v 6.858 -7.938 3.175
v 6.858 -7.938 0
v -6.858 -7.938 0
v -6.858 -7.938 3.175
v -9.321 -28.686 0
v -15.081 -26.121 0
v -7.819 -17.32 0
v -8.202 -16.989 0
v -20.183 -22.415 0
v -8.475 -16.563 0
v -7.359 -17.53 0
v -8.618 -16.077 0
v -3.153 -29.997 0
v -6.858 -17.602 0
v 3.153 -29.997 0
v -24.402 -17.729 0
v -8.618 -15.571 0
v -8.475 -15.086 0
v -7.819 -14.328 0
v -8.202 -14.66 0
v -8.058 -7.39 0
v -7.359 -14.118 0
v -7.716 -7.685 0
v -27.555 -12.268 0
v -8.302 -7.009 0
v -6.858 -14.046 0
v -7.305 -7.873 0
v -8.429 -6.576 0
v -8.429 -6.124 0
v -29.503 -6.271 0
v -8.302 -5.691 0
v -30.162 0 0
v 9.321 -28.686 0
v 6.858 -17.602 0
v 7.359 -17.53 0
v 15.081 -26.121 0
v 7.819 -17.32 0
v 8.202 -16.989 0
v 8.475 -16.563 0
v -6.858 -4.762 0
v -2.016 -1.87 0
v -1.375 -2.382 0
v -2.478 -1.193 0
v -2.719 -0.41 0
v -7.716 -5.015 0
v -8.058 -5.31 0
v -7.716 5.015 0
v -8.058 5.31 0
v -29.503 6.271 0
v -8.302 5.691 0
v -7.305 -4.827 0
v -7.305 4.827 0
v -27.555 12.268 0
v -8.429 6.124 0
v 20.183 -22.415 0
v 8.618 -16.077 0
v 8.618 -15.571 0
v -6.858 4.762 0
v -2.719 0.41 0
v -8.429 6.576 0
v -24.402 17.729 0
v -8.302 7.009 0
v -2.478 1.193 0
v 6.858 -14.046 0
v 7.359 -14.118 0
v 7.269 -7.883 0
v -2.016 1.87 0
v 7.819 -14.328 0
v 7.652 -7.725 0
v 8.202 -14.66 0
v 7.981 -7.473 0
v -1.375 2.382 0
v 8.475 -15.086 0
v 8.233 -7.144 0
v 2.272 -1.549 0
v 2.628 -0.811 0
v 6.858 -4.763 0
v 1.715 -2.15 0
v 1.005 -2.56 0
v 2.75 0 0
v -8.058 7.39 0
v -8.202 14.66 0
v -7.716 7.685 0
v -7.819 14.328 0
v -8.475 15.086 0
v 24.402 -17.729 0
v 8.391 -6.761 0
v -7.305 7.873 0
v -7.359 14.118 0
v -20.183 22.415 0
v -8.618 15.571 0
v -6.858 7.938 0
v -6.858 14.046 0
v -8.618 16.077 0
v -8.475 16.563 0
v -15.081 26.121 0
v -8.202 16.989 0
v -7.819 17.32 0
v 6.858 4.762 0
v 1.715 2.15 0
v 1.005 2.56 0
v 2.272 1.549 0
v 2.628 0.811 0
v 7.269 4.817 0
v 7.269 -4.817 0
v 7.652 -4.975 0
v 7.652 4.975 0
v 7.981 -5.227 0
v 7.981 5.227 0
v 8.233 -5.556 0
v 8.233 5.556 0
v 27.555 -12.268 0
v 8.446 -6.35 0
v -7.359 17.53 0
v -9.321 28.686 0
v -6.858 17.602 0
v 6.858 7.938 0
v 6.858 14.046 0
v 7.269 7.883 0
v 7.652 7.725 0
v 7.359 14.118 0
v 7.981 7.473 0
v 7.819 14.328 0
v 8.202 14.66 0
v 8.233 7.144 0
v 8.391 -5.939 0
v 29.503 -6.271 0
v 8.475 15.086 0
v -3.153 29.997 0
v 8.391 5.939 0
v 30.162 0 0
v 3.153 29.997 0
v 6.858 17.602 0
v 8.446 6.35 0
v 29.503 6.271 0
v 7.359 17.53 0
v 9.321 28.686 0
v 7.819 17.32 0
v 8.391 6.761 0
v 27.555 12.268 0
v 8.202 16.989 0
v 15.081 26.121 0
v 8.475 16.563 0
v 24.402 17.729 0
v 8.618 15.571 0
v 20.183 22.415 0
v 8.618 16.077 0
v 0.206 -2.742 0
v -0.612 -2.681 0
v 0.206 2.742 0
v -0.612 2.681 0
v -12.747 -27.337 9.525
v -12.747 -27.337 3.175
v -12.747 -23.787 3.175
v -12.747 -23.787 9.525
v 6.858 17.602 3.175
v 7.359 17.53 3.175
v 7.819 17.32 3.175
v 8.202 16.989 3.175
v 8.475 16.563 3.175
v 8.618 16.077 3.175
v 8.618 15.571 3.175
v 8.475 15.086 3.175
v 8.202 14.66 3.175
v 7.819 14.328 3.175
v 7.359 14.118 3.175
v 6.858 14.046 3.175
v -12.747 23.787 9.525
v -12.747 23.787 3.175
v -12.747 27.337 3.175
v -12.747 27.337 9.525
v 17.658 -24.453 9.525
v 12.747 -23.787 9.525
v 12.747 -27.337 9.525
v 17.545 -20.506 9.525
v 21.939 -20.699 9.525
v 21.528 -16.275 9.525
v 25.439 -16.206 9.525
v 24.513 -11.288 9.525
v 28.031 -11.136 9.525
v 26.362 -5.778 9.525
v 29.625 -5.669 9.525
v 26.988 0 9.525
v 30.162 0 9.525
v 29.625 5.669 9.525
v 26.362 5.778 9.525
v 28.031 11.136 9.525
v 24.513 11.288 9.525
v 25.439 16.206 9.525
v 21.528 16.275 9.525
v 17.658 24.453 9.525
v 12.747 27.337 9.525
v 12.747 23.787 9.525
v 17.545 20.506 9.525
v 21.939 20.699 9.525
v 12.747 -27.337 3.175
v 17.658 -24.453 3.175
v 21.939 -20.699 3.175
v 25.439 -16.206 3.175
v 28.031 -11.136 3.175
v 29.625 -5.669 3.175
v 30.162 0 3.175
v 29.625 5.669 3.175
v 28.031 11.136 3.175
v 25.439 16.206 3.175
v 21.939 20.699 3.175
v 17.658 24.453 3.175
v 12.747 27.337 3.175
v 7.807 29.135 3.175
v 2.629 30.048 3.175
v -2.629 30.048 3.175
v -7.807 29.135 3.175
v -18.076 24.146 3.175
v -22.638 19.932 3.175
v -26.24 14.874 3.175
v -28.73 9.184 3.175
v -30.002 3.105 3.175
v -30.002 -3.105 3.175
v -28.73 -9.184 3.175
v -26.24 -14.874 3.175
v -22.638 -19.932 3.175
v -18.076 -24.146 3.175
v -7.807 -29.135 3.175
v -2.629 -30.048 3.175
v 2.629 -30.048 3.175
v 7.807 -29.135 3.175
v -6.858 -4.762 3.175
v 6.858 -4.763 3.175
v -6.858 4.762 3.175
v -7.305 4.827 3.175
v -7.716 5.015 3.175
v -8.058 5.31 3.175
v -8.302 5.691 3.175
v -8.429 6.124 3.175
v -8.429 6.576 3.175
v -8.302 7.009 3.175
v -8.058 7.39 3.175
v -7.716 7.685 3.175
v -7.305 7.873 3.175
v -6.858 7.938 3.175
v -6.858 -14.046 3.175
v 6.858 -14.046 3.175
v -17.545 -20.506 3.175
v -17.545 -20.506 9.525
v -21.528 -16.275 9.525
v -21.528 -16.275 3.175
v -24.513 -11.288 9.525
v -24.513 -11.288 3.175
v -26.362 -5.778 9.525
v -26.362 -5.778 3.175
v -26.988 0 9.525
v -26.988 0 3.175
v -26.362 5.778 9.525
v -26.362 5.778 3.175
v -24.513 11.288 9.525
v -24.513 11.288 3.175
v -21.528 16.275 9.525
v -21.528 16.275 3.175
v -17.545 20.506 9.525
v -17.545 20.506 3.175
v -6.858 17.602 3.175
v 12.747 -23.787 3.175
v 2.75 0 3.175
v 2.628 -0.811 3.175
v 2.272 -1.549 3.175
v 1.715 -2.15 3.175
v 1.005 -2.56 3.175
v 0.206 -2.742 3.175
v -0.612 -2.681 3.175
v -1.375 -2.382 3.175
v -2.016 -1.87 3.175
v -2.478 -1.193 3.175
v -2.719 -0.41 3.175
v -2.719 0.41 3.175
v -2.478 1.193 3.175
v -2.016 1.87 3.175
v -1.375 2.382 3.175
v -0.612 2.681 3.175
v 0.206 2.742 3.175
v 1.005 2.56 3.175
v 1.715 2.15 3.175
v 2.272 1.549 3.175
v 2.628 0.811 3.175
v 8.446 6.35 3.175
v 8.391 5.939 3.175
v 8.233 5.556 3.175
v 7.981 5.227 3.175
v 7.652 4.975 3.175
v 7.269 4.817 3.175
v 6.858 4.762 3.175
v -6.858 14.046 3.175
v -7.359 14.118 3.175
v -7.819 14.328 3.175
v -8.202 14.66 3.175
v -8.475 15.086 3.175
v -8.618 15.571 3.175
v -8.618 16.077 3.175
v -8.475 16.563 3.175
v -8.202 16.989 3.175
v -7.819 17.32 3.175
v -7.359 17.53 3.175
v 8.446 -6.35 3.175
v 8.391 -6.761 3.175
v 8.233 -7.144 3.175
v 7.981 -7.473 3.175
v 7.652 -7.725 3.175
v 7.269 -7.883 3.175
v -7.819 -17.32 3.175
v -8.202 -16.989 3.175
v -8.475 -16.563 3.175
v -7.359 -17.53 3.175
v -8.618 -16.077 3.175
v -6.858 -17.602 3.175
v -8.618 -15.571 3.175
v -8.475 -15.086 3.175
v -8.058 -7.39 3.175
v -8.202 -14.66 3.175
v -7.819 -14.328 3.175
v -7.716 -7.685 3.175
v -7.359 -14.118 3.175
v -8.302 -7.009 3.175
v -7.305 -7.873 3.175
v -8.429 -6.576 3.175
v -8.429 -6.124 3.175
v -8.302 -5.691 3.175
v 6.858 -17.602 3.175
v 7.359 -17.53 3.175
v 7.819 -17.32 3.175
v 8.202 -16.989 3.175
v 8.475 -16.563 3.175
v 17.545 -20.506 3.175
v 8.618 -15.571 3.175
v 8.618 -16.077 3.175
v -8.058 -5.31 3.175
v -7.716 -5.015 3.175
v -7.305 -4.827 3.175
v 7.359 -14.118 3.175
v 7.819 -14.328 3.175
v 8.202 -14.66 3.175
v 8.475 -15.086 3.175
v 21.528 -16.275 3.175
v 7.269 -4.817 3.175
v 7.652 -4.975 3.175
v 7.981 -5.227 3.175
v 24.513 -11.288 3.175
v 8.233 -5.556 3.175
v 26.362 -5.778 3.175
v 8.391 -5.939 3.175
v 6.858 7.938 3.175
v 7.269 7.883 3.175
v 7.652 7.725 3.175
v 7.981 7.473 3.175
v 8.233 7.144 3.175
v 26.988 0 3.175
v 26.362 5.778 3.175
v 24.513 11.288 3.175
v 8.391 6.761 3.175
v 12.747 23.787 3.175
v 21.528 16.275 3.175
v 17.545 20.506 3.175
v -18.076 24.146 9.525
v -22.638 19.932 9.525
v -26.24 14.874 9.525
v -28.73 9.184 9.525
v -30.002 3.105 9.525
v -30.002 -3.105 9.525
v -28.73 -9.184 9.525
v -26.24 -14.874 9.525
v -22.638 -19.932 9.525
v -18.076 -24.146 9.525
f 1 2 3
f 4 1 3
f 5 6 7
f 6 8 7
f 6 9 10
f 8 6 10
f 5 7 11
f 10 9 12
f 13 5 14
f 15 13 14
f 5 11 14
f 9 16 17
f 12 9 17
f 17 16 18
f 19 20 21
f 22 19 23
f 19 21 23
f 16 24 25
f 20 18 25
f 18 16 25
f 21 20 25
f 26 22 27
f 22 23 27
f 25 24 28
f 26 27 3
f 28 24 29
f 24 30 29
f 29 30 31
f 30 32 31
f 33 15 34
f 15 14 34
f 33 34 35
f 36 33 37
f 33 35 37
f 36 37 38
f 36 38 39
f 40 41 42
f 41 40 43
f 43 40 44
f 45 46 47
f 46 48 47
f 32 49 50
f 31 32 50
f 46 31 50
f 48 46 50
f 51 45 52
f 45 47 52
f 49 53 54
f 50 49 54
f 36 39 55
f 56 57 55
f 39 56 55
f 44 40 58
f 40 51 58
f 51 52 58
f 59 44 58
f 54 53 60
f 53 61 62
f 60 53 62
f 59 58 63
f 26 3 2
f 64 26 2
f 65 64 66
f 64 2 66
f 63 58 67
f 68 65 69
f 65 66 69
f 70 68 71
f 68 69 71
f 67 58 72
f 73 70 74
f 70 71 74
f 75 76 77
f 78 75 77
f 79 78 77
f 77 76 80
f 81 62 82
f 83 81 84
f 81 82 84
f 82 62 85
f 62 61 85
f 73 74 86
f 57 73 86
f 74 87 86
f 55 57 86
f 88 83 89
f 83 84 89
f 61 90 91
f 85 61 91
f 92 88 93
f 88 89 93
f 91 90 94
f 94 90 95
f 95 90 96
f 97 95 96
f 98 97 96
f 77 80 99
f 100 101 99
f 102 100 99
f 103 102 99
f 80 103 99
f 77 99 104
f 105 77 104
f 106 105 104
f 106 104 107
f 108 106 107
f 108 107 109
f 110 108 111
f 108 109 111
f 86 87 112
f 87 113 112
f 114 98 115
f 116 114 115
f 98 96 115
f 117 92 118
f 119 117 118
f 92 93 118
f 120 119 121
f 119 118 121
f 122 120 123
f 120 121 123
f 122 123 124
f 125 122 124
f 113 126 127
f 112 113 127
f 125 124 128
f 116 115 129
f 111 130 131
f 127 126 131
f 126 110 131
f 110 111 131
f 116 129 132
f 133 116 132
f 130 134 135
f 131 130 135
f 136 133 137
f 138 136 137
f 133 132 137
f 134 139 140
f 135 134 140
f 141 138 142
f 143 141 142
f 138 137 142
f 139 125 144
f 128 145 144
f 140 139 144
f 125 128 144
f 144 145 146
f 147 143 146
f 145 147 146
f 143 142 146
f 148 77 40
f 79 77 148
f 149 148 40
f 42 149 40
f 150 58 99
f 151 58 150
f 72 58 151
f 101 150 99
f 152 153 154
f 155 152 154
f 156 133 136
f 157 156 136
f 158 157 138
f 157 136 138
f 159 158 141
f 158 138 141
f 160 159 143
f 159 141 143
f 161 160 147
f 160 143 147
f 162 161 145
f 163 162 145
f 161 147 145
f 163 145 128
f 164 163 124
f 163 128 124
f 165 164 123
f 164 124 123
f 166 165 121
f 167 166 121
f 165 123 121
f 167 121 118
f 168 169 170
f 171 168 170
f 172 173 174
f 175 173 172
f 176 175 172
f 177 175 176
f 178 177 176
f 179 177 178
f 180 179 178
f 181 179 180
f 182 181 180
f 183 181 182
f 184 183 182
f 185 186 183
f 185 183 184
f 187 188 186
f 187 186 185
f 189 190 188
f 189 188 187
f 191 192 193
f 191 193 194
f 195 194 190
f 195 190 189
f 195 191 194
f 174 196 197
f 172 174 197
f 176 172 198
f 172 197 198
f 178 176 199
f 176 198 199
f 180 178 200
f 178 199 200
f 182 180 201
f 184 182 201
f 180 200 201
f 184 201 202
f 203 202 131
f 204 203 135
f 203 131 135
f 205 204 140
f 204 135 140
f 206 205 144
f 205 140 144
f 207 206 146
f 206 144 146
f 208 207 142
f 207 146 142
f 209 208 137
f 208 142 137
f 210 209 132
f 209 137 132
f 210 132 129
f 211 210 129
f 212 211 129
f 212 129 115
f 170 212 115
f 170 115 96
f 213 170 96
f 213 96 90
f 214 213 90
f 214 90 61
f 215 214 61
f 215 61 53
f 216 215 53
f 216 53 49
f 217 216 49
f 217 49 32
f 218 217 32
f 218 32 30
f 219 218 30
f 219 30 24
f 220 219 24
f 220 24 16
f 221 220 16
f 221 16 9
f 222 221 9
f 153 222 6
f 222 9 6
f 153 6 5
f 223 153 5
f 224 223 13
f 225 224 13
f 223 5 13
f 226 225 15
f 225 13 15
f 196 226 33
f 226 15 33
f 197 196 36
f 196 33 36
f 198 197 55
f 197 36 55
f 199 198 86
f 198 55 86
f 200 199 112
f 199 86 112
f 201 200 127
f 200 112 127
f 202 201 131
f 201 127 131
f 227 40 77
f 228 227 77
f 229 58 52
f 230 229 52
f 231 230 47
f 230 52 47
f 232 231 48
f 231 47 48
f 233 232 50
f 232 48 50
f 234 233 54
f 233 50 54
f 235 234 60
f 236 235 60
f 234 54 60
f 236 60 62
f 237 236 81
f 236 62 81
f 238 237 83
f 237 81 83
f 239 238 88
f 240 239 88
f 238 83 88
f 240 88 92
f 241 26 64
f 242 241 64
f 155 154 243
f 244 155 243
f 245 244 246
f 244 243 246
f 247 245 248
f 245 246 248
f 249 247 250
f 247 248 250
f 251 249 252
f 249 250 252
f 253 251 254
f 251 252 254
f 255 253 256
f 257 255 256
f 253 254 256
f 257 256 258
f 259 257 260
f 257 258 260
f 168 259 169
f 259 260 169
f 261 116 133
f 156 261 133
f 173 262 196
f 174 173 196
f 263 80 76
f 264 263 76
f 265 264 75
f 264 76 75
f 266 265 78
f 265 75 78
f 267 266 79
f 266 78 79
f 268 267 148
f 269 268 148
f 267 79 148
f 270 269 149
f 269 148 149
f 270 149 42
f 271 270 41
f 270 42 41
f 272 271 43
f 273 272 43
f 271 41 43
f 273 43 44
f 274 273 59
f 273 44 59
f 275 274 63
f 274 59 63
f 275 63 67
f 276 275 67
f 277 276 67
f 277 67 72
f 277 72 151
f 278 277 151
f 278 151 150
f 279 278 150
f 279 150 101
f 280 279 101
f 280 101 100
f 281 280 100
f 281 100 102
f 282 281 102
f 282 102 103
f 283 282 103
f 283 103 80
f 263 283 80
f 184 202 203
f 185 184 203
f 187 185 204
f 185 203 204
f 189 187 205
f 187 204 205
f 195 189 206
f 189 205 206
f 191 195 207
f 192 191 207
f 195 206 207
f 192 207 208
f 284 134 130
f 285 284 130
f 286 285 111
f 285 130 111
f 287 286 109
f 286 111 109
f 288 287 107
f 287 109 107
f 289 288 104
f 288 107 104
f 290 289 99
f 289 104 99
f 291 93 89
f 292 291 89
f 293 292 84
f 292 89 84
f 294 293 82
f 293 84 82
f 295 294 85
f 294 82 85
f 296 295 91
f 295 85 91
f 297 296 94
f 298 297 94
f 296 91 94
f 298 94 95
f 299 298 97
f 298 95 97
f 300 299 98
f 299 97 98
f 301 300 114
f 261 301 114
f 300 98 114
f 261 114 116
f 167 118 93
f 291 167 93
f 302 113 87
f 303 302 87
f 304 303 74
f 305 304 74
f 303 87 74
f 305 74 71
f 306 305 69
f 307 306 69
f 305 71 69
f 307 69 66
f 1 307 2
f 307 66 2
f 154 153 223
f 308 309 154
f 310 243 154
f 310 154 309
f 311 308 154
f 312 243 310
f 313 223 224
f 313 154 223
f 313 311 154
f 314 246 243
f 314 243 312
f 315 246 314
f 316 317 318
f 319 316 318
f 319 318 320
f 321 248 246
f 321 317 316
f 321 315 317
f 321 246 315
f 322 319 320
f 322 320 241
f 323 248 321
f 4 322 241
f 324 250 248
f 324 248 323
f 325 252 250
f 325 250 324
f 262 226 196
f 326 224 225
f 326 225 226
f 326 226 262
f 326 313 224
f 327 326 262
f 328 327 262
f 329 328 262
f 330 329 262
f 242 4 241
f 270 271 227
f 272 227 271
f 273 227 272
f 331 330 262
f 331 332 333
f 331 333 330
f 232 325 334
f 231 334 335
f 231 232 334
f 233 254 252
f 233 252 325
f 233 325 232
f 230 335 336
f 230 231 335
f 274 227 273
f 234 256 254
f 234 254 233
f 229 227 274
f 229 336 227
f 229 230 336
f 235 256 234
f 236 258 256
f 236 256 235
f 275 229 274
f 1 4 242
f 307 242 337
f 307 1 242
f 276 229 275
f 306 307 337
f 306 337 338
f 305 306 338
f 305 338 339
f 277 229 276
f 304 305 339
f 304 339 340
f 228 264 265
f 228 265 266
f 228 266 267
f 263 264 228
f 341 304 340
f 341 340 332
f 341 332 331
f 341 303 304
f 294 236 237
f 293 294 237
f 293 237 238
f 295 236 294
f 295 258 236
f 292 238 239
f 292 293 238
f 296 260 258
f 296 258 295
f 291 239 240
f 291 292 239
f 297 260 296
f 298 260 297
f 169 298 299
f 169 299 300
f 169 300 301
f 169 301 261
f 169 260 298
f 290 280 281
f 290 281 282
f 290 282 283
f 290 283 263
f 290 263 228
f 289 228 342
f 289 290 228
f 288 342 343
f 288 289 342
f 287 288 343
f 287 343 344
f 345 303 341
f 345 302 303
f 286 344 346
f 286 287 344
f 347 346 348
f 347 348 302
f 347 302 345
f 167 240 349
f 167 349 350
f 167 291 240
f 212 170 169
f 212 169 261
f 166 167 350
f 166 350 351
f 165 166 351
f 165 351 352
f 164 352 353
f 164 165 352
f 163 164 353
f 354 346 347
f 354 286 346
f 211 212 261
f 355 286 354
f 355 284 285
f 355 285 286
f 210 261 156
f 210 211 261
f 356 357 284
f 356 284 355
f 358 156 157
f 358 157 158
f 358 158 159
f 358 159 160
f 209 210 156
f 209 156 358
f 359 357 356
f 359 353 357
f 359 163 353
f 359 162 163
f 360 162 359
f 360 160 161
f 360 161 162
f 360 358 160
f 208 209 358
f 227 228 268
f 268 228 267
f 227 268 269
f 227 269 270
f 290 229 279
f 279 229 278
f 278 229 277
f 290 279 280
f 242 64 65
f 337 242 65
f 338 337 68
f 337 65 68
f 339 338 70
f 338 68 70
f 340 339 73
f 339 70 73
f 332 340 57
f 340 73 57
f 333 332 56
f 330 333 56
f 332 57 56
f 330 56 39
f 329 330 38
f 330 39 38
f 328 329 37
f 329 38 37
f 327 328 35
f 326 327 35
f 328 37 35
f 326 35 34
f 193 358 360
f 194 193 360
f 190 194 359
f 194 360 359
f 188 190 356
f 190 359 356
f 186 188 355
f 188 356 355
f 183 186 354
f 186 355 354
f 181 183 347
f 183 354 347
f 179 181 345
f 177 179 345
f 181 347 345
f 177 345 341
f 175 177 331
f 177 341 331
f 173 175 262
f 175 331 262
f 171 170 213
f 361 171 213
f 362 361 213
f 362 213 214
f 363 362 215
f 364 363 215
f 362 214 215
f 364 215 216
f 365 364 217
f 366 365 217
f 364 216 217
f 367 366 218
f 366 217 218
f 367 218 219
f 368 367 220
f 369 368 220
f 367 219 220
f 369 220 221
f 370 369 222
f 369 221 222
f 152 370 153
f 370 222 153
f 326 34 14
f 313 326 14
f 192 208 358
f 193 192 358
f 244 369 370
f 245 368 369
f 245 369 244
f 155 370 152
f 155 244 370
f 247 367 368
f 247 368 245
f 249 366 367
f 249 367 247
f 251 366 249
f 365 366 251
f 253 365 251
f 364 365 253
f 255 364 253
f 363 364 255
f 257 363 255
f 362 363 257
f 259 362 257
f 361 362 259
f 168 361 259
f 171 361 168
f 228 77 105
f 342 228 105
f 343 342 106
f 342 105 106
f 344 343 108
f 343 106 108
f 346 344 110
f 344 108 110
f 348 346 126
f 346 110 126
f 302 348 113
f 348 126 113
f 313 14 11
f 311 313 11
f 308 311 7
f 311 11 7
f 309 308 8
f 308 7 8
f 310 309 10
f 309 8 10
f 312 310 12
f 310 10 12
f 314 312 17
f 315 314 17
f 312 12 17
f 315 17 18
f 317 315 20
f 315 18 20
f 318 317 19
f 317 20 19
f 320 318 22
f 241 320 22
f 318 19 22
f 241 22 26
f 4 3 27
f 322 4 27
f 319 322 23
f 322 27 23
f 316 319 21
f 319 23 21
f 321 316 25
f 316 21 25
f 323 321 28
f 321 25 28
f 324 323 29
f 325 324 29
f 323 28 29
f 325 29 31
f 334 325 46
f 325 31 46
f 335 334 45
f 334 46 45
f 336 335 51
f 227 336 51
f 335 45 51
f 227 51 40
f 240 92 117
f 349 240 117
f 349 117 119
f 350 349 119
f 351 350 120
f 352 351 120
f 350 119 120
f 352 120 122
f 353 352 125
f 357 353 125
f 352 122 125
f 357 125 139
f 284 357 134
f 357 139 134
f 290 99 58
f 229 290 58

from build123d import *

# Parameters (mm, degrees)
F0_R     = 30.1625
F1_DEPTH = 3.175
F3_DEPTH = 6.35
F4_R     = 2.75
F5_DEPTH = 25.4


with BuildPart() as f1:
    # F0 (on Top) → F1 (new body)
    with BuildSketch(Plane.XY):
        Circle(F0_R)
    extrude(amount=F1_DEPTH)

    # F2 (on face) → F3 (join)
    with BuildSketch(Plane.XY.offset(3.175)):
        with BuildLine():
            ThreePointArc((-12.747223, -23.787254), (-26.9875, 0), (-12.747223, 23.787254))
            Line((-12.747223, 23.787254), (-12.747223, 27.336509))
            ThreePointArc((-12.747223, 27.336509), (-30.1625, 0), (-12.747223, -27.336509))
            Line((-12.747223, -27.336509), (-12.747223, -23.787254))
        make_face()
        with BuildLine():
            ThreePointArc((30.1625, 0), (25.438794, 16.206299), (12.747223, 27.336509))
            Line((12.747223, 27.336509), (12.747223, 23.787254))
            ThreePointArc((12.747223, 23.787254), (26.9875, 0), (12.747223, -23.787254))
            Line((12.747223, -23.787254), (12.747223, -27.336509))
            ThreePointArc((12.747223, -27.336509), (25.438794, -16.206299), (30.1625, 0))
        make_face()
    extrude(amount=F3_DEPTH)

    # F4 (on face) → F5 (cut)
    with BuildSketch(Plane(origin=(0, 0, 0), x_dir=(1, 0, 0), z_dir=(0, 0, -1))):
        with BuildLine():
            Line((6.858, 17.6022), (-6.858, 17.6022))
            ThreePointArc((-6.858, 17.6022), (-8.636, 15.8242), (-6.858, 14.0462))
            Line((-6.858, 14.0462), (6.858, 14.0462))
            ThreePointArc((6.858, 14.0462), (8.636, 15.8242), (6.858, 17.6022))
        make_face()
        with BuildLine():
            ThreePointArc((6.858, -17.6022), (8.636, -15.8242), (6.858, -14.0462))
            Line((6.858, -14.0462), (-6.858, -14.0462))
            ThreePointArc((-6.858, -14.0462), (-8.636, -15.8242), (-6.858, -17.6022))
            Line((-6.858, -17.6022), (6.858, -17.6022))
        make_face()
        Circle(F4_R)
        with BuildLine():
            ThreePointArc((-6.858, 4.7625), (-5.735468, 5.227468), (-5.2705, 6.35))
            ThreePointArc((-5.2705, 6.35), (-5.735468, 7.472532), (-6.858, 7.9375))
            ThreePointArc((-6.858, 7.9375), (-8.4455, 6.35), (-6.858, 4.7625))
        make_face()
        with BuildLine():
            ThreePointArc((-6.858, 7.9375), (-5.735468, 7.472532), (-5.2705, 6.35))
            ThreePointArc((-5.2705, 6.35), (-5.735468, 5.227468), (-6.858, 4.7625))
            Line((-6.858, 4.7625), (6.858, 4.7625))
            ThreePointArc((6.858, 4.7625), (5.2705, 6.35), (6.858, 7.9375))
            Line((6.858, 7.9375), (-6.858, 7.9375))
        make_face()
        with BuildLine():
            ThreePointArc((8.4455, 6.35), (7.980532, 7.472532), (6.858, 7.9375))
            ThreePointArc((6.858, 7.9375), (5.2705, 6.35), (6.858, 4.7625))
            ThreePointArc((6.858, 4.7625), (7.980532, 5.227468), (8.4455, 6.35))
        make_face()
        with BuildLine():
            Line((6.858, -4.7625), (-6.858, -4.7625))
            ThreePointArc((-6.858, -4.7625), (-5.735468, -5.227468), (-5.2705, -6.35))
            ThreePointArc((-5.2705, -6.35), (-5.735468, -7.472532), (-6.858, -7.9375))
            Line((-6.858, -7.9375), (6.858, -7.9375))
            ThreePointArc((6.858, -7.9375), (5.2705, -6.35), (6.858, -4.7625))
        make_face()
        with BuildLine():
            ThreePointArc((-5.2705, -6.35), (-5.735468, -5.227468), (-6.858, -4.7625))
            ThreePointArc((-6.858, -4.7625), (-8.4455, -6.35), (-6.858, -7.9375))
            ThreePointArc((-6.858, -7.9375), (-5.735468, -7.472532), (-5.2705, -6.35))
        make_face()
        with BuildLine():
            ThreePointArc((8.4455, -6.35), (7.980532, -5.227468), (6.858, -4.7625))
            ThreePointArc((6.858, -4.7625), (5.2705, -6.35), (6.858, -7.9375))
            ThreePointArc((6.858, -7.9375), (7.980532, -7.472532), (8.4455, -6.35))
        make_face()
    extrude(amount=-F5_DEPTH, mode=Mode.SUBTRACT)


solid = f1.part
